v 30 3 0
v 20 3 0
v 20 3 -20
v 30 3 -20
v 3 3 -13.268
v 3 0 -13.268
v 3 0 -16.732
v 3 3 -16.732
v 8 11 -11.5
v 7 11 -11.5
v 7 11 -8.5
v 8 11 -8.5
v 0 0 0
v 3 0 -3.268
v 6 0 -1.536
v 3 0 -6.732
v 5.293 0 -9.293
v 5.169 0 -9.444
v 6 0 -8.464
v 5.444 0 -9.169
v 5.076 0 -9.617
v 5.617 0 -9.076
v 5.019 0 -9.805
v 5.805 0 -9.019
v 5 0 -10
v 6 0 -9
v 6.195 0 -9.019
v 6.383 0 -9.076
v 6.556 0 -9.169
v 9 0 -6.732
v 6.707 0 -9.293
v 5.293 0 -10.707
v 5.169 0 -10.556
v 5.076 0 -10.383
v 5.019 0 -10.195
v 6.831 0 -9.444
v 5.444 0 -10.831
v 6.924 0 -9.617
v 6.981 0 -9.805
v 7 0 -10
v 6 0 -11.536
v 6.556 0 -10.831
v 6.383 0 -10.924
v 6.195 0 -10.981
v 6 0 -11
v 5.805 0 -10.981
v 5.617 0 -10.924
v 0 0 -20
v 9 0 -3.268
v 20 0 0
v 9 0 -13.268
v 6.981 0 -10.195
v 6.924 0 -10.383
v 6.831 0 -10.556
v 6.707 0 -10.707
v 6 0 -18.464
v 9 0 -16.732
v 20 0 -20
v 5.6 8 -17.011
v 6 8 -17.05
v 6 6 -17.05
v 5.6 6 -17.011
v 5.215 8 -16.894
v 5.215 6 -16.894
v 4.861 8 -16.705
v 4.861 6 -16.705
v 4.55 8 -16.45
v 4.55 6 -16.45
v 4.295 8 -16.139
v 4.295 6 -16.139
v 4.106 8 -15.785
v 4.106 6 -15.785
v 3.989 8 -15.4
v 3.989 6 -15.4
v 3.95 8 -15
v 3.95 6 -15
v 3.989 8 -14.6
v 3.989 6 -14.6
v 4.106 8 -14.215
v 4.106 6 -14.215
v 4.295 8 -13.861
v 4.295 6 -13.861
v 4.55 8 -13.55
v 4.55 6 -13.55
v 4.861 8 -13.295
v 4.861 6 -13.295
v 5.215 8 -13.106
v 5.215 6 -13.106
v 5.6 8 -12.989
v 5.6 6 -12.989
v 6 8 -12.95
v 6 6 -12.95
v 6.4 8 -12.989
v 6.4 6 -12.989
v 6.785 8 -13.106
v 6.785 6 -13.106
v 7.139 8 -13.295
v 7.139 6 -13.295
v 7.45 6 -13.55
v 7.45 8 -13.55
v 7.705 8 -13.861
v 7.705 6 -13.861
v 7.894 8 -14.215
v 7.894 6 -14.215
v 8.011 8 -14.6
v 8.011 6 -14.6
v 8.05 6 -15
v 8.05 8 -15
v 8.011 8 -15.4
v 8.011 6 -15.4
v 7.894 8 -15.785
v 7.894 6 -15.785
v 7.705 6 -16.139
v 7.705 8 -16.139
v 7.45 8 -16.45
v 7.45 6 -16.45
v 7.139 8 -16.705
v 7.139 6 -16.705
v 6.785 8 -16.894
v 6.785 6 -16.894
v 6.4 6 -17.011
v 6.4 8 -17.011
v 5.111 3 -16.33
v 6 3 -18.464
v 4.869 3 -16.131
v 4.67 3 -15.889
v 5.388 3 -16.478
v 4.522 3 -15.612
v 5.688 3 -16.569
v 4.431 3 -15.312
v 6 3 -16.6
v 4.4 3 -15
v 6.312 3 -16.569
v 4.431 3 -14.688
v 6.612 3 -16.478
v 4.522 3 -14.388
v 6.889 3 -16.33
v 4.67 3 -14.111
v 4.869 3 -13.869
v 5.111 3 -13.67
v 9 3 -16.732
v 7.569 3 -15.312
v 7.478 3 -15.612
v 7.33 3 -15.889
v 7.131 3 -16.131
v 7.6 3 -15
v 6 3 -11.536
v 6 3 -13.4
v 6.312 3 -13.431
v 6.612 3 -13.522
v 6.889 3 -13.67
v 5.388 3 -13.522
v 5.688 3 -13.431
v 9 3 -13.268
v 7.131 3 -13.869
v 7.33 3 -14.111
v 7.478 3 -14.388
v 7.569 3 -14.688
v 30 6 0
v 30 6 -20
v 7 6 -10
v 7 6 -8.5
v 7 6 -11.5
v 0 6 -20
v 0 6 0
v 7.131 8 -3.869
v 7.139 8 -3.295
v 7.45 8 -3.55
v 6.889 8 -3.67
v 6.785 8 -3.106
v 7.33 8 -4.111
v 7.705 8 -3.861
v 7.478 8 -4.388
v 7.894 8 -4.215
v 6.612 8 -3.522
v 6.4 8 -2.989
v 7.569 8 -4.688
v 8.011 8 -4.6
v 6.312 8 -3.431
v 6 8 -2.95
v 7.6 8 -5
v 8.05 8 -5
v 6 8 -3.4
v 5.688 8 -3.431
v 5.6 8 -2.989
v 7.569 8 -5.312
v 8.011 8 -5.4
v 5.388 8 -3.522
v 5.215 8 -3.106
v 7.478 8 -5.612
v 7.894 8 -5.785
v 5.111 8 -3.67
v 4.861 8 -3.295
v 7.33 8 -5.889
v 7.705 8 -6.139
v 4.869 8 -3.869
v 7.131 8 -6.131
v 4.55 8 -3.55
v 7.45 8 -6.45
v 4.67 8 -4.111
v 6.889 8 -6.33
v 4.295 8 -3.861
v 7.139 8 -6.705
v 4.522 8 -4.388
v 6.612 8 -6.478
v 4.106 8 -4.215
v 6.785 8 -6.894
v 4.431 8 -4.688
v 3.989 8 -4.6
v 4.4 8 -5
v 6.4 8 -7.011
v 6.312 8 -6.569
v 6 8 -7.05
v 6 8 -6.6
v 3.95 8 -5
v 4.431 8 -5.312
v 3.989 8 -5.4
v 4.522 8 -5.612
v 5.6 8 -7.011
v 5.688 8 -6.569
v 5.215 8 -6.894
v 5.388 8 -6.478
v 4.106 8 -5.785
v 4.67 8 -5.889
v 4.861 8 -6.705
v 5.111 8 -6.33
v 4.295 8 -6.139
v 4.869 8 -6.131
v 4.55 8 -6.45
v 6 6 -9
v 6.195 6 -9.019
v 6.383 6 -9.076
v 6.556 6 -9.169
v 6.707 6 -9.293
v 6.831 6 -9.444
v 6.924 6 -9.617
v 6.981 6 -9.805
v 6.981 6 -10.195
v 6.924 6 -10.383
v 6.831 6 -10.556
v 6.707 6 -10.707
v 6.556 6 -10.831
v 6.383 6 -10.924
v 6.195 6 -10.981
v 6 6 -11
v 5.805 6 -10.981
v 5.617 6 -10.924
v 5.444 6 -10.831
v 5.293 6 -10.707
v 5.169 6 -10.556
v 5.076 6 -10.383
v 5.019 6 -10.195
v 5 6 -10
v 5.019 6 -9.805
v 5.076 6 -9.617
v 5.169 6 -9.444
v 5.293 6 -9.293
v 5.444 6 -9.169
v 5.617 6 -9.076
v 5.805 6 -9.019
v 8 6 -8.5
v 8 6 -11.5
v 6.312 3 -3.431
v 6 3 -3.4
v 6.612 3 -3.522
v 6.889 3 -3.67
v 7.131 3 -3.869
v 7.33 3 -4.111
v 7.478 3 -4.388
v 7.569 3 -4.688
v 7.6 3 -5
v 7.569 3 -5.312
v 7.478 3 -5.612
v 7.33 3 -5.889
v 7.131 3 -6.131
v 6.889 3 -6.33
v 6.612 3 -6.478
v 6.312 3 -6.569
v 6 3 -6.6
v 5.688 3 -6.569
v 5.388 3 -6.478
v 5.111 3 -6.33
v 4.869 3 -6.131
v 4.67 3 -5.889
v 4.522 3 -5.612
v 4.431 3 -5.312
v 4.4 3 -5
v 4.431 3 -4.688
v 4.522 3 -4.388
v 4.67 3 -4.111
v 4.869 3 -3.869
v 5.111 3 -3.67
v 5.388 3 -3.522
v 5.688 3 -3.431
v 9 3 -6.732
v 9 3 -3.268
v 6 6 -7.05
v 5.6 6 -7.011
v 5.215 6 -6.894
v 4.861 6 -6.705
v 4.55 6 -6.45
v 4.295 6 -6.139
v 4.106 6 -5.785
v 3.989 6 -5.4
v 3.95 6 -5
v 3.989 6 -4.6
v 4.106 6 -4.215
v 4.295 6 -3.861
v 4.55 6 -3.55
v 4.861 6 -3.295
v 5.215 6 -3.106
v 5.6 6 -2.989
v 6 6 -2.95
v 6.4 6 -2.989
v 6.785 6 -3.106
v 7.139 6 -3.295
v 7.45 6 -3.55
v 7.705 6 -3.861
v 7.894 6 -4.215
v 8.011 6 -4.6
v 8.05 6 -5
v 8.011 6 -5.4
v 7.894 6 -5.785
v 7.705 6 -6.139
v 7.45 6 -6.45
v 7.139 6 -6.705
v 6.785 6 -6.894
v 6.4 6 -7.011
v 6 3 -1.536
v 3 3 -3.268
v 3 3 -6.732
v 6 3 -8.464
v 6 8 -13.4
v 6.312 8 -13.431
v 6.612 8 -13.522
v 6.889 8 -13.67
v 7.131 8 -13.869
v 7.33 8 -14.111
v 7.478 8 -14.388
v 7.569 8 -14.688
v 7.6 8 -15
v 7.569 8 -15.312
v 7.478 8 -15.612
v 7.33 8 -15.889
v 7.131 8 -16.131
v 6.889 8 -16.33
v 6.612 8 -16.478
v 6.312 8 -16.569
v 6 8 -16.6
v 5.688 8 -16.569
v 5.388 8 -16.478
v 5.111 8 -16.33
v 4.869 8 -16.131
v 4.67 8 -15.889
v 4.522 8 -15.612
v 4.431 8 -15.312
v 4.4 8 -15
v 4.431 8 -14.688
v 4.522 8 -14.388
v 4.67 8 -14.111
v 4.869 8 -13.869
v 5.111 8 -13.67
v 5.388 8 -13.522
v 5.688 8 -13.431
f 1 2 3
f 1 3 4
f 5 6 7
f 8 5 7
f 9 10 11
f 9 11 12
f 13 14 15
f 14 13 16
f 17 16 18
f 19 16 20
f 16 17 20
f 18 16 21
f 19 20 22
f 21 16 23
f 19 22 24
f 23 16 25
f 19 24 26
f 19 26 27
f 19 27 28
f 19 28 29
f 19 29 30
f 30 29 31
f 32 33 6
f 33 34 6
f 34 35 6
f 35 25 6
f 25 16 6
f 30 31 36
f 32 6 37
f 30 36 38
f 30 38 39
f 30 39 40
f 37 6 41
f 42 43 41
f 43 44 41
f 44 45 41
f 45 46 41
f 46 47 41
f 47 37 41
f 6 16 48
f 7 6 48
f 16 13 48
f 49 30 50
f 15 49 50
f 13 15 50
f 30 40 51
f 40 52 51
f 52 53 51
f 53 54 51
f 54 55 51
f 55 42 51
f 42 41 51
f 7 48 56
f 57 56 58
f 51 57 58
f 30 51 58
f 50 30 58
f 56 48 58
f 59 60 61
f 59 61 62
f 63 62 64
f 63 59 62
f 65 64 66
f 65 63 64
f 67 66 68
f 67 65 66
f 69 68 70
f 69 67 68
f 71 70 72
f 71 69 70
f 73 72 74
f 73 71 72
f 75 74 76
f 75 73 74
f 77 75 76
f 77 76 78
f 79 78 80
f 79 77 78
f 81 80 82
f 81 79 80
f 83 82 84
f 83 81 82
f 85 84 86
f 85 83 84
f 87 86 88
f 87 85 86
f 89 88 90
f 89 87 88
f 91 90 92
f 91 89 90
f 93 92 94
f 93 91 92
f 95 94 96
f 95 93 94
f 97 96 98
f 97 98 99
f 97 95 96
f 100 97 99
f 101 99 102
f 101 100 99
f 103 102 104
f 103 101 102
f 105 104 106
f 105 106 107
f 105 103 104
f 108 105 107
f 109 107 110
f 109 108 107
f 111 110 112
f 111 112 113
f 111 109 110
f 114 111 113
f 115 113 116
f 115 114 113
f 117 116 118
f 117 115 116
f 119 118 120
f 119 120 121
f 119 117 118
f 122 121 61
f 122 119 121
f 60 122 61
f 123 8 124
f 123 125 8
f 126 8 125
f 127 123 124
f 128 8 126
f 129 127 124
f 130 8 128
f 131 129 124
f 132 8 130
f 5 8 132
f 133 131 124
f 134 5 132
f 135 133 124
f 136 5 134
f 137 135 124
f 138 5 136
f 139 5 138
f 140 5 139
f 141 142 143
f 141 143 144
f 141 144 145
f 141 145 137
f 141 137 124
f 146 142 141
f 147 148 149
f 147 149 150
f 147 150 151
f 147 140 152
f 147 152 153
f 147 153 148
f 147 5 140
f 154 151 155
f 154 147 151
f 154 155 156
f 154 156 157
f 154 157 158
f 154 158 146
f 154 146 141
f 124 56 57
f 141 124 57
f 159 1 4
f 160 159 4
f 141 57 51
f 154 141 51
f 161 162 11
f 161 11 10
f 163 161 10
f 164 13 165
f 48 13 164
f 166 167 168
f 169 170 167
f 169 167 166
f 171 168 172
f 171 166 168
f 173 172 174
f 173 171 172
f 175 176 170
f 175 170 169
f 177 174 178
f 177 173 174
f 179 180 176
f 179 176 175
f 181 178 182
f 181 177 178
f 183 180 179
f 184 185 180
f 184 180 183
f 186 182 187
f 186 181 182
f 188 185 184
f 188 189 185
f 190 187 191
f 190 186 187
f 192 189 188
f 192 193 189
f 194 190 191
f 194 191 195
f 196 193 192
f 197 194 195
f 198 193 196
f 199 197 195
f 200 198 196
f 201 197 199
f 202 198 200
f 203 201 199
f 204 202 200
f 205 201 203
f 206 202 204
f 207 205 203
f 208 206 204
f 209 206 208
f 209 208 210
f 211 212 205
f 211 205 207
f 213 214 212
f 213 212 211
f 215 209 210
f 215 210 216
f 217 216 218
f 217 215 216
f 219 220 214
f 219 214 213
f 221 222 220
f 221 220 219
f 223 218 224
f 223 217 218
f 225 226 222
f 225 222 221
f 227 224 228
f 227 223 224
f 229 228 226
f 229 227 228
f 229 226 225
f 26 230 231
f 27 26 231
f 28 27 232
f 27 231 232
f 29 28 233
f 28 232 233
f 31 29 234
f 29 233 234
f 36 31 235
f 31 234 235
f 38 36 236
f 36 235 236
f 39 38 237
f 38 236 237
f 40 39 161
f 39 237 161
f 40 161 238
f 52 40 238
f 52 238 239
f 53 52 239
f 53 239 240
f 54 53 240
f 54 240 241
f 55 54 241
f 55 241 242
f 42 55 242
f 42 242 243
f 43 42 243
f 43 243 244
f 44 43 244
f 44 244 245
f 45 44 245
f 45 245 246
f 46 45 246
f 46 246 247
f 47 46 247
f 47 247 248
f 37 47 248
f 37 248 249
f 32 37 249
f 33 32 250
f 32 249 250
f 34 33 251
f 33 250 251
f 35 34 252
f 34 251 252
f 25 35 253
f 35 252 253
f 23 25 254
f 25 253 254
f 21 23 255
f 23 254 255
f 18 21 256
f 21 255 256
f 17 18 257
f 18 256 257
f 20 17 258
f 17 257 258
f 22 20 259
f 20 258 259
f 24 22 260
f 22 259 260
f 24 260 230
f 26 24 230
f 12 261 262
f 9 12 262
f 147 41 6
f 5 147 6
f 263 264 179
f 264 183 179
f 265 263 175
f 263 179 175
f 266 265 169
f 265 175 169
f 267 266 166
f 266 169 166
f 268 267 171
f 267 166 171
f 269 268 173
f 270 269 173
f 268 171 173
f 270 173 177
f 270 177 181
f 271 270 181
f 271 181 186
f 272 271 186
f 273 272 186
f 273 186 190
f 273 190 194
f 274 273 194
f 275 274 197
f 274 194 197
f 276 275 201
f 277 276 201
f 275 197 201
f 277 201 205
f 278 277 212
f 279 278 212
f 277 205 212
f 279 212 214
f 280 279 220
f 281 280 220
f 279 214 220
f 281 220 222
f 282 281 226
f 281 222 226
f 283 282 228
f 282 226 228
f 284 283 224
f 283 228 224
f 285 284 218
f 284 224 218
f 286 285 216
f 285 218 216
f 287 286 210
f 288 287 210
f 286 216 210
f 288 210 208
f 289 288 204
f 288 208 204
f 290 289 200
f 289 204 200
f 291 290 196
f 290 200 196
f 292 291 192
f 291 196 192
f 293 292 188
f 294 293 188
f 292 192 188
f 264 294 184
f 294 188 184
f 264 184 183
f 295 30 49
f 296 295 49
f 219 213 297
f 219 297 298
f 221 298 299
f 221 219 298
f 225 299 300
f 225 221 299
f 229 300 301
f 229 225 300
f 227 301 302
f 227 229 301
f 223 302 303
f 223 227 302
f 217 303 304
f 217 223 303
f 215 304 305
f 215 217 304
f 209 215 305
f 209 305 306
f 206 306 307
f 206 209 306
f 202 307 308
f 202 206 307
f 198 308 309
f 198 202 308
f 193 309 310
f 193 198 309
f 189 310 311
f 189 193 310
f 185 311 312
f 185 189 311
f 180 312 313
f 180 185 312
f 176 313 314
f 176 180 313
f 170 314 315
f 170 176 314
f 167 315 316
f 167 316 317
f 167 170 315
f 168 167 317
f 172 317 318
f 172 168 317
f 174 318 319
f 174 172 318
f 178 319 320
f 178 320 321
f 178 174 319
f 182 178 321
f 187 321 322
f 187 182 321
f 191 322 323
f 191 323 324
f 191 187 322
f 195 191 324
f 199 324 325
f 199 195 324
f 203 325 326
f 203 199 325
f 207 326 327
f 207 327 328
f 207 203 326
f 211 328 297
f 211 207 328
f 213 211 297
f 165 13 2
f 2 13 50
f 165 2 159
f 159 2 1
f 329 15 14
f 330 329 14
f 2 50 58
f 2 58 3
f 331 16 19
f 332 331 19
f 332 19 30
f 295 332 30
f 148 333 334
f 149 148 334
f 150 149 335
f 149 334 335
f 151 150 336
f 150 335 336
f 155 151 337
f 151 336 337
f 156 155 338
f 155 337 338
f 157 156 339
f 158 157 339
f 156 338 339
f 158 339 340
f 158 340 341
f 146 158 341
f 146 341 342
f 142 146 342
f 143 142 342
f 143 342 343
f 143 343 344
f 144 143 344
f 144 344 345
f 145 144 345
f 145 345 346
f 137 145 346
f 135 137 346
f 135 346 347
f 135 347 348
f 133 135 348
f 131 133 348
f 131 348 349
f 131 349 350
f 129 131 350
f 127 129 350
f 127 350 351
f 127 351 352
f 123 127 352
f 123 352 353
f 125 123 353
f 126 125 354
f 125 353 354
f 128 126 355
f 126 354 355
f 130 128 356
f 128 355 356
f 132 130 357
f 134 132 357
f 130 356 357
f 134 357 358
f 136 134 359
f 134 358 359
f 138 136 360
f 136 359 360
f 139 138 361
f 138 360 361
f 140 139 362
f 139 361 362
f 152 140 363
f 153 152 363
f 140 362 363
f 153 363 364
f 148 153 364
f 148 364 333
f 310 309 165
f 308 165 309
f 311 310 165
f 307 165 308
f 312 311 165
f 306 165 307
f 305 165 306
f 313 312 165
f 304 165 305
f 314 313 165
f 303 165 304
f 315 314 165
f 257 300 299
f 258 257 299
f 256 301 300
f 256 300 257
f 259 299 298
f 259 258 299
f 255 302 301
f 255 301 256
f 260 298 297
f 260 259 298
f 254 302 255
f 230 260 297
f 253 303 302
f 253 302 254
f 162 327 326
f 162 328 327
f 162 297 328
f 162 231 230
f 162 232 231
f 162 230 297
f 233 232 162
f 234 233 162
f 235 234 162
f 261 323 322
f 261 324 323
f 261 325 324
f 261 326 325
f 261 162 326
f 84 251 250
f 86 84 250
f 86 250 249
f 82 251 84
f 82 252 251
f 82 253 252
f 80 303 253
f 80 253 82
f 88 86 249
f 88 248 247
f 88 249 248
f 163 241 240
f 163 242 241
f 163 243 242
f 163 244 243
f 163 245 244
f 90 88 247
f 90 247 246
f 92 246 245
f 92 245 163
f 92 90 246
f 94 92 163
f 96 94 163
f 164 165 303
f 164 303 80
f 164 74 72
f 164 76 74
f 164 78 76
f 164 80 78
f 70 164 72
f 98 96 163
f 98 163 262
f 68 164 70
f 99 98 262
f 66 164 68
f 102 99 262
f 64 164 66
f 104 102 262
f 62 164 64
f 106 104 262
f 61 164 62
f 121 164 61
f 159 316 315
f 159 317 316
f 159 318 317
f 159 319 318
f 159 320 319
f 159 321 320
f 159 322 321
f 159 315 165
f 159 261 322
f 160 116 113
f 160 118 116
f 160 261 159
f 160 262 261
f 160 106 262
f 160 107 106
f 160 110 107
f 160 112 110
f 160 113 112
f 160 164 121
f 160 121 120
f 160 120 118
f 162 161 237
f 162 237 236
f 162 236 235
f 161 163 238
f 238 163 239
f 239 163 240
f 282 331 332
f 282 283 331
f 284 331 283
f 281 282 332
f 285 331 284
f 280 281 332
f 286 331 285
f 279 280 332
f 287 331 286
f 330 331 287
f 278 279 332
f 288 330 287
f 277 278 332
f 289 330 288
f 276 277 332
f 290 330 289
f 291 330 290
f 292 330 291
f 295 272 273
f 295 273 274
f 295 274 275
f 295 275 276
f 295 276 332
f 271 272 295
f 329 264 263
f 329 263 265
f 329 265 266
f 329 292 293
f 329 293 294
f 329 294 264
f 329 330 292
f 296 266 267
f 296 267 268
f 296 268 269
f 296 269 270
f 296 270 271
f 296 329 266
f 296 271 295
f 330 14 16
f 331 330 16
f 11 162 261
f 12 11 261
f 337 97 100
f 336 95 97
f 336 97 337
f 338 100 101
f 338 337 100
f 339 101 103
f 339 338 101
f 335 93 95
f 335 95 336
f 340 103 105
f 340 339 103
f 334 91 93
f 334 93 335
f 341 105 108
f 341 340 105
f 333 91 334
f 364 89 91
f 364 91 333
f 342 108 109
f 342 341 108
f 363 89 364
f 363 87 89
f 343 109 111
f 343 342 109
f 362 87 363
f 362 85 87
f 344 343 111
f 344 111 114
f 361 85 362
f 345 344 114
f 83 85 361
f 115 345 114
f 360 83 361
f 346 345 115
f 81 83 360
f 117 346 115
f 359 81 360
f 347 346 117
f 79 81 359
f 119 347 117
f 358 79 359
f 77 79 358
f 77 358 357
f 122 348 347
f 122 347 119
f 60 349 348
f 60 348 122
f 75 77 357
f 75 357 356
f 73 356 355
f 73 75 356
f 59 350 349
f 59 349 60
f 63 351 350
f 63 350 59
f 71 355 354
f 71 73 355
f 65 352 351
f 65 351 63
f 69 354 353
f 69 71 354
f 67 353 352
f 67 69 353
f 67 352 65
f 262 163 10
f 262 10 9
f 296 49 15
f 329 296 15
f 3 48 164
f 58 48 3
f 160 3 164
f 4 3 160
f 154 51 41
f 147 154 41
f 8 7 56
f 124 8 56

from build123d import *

# Parameters (mm, degrees)
CROQUIS1_W              = 30
CROQUIS1_H              = 20
SALIENTE_EXTRUIR1_DEPTH = 6
CROQUIS3_R              = 1.6
CORTAR_EXTRUIR2_DEPTH   = 40
SALIENTE_EXTRUIR2_START = 2
CROQUIS4_R              = 2.05
CROQUIS4_R_2            = 1.6
SALIENTE_EXTRUIR2_DEPTH = 2
CORTAR_EXTRUIR3_DEPTH   = 3
CROQUIS6_W              = 10
CROQUIS6_H              = 3
CORTAR_EXTRUIR4_DEPTH   = 24
CROQUIS7_R              = 1
CORTAR_EXTRUIR5_DEPTH   = 24
CROQUIS8_W              = 1
CROQUIS8_H              = 3
SALIENTE_EXTRUIR3_DEPTH = 5


with BuildPart() as part:
    # Croquis1 → Saliente-Extruir1 (new body)
    with BuildSketch(Plane(origin=(0, 0, 0), x_dir=(1, 0, 0), z_dir=(0, 1, 0))):
        with Locations((15, 10)):
            Rectangle(CROQUIS1_W, CROQUIS1_H)
    extrude(amount=SALIENTE_EXTRUIR1_DEPTH)

    # Croquis3 → Cortar-Extruir2 (cut)
    with BuildSketch(Plane(origin=(0, 6, 0), x_dir=(1, 0, 0), z_dir=(0, 1, 0))):
        with Locations(Location((6, 5, 0), (0, 0, 270))):
            Circle(CROQUIS3_R)
        with Locations(Location((6, 15, 0), (0, 0, 270))):
            Circle(CROQUIS3_R)
    extrude(amount=-CORTAR_EXTRUIR2_DEPTH, mode=Mode.SUBTRACT)

    # Croquis4 → Saliente-Extruir2 (add)
    # profile 1 of 2: a face of its own
    with BuildSketch(Plane(origin=(0, 6, 0), x_dir=(1, 0, 0), z_dir=(0, 1, 0)).offset(SALIENTE_EXTRUIR2_START)):
        with Locations(Location((6, 15, 0), (0, 0, 90))):
            Circle(CROQUIS4_R)
        with Locations(Location((6, 15, 0), (0, 0, 270))):
            Circle(CROQUIS4_R_2, mode=Mode.SUBTRACT)
    # profile 2 of 2: a face of its own
    with BuildSketch(Plane(origin=(0, 6, 0), x_dir=(1, 0, 0), z_dir=(0, 1, 0)).offset(SALIENTE_EXTRUIR2_START)):
        with Locations(Location((6, 5, 0), (0, 0, 90))):
            Circle(CROQUIS4_R)
        with Locations(Location((6, 5, 0), (0, 0, 270))):
            Circle(CROQUIS4_R_2, mode=Mode.SUBTRACT)
    extrude(amount=-SALIENTE_EXTRUIR2_DEPTH)

    # Croquis5 → Cortar-Extruir3 (cut)
    with BuildSketch(Plane.XZ):
        Polygon((9, -6.732050808), (9, -3.267949192), (6, -1.535898385), (3, -3.267949192), (3, -6.732050808), (6, -8.464101615), align=None)
        Polygon((9, -16.732050808), (9, -13.267949192), (6, -11.535898385), (3, -13.267949192), (3, -16.732050808), (6, -18.464101615), align=None)
    extrude(amount=-CORTAR_EXTRUIR3_DEPTH, mode=Mode.SUBTRACT)

    # Croquis6 → Cortar-Extruir4 (cut)
    with BuildSketch(Plane.XY):
        with Locations((25, 1.5)):
            Rectangle(CROQUIS6_W, CROQUIS6_H)
    extrude(amount=-CORTAR_EXTRUIR4_DEPTH, mode=Mode.SUBTRACT)

    # Croquis7 → Cortar-Extruir5 (cut)
    with BuildSketch(Plane(origin=(0, 6, 0), x_dir=(1, 0, 0), z_dir=(0, 1, 0))):
        with Locations(Location((6, 10, 0), (0, 0, 270))):
            Circle(CROQUIS7_R)
    extrude(amount=-CORTAR_EXTRUIR5_DEPTH, mode=Mode.SUBTRACT)

    # Croquis8 → Saliente-Extruir3 (add)
    with BuildSketch(Plane(origin=(0, 6, 0), x_dir=(1, 0, 0), z_dir=(0, 1, 0))):
        with Locations((7.5, 10)):
            Rectangle(CROQUIS8_W, CROQUIS8_H)
    extrude(amount=SALIENTE_EXTRUIR3_DEPTH)


solid = part.part
